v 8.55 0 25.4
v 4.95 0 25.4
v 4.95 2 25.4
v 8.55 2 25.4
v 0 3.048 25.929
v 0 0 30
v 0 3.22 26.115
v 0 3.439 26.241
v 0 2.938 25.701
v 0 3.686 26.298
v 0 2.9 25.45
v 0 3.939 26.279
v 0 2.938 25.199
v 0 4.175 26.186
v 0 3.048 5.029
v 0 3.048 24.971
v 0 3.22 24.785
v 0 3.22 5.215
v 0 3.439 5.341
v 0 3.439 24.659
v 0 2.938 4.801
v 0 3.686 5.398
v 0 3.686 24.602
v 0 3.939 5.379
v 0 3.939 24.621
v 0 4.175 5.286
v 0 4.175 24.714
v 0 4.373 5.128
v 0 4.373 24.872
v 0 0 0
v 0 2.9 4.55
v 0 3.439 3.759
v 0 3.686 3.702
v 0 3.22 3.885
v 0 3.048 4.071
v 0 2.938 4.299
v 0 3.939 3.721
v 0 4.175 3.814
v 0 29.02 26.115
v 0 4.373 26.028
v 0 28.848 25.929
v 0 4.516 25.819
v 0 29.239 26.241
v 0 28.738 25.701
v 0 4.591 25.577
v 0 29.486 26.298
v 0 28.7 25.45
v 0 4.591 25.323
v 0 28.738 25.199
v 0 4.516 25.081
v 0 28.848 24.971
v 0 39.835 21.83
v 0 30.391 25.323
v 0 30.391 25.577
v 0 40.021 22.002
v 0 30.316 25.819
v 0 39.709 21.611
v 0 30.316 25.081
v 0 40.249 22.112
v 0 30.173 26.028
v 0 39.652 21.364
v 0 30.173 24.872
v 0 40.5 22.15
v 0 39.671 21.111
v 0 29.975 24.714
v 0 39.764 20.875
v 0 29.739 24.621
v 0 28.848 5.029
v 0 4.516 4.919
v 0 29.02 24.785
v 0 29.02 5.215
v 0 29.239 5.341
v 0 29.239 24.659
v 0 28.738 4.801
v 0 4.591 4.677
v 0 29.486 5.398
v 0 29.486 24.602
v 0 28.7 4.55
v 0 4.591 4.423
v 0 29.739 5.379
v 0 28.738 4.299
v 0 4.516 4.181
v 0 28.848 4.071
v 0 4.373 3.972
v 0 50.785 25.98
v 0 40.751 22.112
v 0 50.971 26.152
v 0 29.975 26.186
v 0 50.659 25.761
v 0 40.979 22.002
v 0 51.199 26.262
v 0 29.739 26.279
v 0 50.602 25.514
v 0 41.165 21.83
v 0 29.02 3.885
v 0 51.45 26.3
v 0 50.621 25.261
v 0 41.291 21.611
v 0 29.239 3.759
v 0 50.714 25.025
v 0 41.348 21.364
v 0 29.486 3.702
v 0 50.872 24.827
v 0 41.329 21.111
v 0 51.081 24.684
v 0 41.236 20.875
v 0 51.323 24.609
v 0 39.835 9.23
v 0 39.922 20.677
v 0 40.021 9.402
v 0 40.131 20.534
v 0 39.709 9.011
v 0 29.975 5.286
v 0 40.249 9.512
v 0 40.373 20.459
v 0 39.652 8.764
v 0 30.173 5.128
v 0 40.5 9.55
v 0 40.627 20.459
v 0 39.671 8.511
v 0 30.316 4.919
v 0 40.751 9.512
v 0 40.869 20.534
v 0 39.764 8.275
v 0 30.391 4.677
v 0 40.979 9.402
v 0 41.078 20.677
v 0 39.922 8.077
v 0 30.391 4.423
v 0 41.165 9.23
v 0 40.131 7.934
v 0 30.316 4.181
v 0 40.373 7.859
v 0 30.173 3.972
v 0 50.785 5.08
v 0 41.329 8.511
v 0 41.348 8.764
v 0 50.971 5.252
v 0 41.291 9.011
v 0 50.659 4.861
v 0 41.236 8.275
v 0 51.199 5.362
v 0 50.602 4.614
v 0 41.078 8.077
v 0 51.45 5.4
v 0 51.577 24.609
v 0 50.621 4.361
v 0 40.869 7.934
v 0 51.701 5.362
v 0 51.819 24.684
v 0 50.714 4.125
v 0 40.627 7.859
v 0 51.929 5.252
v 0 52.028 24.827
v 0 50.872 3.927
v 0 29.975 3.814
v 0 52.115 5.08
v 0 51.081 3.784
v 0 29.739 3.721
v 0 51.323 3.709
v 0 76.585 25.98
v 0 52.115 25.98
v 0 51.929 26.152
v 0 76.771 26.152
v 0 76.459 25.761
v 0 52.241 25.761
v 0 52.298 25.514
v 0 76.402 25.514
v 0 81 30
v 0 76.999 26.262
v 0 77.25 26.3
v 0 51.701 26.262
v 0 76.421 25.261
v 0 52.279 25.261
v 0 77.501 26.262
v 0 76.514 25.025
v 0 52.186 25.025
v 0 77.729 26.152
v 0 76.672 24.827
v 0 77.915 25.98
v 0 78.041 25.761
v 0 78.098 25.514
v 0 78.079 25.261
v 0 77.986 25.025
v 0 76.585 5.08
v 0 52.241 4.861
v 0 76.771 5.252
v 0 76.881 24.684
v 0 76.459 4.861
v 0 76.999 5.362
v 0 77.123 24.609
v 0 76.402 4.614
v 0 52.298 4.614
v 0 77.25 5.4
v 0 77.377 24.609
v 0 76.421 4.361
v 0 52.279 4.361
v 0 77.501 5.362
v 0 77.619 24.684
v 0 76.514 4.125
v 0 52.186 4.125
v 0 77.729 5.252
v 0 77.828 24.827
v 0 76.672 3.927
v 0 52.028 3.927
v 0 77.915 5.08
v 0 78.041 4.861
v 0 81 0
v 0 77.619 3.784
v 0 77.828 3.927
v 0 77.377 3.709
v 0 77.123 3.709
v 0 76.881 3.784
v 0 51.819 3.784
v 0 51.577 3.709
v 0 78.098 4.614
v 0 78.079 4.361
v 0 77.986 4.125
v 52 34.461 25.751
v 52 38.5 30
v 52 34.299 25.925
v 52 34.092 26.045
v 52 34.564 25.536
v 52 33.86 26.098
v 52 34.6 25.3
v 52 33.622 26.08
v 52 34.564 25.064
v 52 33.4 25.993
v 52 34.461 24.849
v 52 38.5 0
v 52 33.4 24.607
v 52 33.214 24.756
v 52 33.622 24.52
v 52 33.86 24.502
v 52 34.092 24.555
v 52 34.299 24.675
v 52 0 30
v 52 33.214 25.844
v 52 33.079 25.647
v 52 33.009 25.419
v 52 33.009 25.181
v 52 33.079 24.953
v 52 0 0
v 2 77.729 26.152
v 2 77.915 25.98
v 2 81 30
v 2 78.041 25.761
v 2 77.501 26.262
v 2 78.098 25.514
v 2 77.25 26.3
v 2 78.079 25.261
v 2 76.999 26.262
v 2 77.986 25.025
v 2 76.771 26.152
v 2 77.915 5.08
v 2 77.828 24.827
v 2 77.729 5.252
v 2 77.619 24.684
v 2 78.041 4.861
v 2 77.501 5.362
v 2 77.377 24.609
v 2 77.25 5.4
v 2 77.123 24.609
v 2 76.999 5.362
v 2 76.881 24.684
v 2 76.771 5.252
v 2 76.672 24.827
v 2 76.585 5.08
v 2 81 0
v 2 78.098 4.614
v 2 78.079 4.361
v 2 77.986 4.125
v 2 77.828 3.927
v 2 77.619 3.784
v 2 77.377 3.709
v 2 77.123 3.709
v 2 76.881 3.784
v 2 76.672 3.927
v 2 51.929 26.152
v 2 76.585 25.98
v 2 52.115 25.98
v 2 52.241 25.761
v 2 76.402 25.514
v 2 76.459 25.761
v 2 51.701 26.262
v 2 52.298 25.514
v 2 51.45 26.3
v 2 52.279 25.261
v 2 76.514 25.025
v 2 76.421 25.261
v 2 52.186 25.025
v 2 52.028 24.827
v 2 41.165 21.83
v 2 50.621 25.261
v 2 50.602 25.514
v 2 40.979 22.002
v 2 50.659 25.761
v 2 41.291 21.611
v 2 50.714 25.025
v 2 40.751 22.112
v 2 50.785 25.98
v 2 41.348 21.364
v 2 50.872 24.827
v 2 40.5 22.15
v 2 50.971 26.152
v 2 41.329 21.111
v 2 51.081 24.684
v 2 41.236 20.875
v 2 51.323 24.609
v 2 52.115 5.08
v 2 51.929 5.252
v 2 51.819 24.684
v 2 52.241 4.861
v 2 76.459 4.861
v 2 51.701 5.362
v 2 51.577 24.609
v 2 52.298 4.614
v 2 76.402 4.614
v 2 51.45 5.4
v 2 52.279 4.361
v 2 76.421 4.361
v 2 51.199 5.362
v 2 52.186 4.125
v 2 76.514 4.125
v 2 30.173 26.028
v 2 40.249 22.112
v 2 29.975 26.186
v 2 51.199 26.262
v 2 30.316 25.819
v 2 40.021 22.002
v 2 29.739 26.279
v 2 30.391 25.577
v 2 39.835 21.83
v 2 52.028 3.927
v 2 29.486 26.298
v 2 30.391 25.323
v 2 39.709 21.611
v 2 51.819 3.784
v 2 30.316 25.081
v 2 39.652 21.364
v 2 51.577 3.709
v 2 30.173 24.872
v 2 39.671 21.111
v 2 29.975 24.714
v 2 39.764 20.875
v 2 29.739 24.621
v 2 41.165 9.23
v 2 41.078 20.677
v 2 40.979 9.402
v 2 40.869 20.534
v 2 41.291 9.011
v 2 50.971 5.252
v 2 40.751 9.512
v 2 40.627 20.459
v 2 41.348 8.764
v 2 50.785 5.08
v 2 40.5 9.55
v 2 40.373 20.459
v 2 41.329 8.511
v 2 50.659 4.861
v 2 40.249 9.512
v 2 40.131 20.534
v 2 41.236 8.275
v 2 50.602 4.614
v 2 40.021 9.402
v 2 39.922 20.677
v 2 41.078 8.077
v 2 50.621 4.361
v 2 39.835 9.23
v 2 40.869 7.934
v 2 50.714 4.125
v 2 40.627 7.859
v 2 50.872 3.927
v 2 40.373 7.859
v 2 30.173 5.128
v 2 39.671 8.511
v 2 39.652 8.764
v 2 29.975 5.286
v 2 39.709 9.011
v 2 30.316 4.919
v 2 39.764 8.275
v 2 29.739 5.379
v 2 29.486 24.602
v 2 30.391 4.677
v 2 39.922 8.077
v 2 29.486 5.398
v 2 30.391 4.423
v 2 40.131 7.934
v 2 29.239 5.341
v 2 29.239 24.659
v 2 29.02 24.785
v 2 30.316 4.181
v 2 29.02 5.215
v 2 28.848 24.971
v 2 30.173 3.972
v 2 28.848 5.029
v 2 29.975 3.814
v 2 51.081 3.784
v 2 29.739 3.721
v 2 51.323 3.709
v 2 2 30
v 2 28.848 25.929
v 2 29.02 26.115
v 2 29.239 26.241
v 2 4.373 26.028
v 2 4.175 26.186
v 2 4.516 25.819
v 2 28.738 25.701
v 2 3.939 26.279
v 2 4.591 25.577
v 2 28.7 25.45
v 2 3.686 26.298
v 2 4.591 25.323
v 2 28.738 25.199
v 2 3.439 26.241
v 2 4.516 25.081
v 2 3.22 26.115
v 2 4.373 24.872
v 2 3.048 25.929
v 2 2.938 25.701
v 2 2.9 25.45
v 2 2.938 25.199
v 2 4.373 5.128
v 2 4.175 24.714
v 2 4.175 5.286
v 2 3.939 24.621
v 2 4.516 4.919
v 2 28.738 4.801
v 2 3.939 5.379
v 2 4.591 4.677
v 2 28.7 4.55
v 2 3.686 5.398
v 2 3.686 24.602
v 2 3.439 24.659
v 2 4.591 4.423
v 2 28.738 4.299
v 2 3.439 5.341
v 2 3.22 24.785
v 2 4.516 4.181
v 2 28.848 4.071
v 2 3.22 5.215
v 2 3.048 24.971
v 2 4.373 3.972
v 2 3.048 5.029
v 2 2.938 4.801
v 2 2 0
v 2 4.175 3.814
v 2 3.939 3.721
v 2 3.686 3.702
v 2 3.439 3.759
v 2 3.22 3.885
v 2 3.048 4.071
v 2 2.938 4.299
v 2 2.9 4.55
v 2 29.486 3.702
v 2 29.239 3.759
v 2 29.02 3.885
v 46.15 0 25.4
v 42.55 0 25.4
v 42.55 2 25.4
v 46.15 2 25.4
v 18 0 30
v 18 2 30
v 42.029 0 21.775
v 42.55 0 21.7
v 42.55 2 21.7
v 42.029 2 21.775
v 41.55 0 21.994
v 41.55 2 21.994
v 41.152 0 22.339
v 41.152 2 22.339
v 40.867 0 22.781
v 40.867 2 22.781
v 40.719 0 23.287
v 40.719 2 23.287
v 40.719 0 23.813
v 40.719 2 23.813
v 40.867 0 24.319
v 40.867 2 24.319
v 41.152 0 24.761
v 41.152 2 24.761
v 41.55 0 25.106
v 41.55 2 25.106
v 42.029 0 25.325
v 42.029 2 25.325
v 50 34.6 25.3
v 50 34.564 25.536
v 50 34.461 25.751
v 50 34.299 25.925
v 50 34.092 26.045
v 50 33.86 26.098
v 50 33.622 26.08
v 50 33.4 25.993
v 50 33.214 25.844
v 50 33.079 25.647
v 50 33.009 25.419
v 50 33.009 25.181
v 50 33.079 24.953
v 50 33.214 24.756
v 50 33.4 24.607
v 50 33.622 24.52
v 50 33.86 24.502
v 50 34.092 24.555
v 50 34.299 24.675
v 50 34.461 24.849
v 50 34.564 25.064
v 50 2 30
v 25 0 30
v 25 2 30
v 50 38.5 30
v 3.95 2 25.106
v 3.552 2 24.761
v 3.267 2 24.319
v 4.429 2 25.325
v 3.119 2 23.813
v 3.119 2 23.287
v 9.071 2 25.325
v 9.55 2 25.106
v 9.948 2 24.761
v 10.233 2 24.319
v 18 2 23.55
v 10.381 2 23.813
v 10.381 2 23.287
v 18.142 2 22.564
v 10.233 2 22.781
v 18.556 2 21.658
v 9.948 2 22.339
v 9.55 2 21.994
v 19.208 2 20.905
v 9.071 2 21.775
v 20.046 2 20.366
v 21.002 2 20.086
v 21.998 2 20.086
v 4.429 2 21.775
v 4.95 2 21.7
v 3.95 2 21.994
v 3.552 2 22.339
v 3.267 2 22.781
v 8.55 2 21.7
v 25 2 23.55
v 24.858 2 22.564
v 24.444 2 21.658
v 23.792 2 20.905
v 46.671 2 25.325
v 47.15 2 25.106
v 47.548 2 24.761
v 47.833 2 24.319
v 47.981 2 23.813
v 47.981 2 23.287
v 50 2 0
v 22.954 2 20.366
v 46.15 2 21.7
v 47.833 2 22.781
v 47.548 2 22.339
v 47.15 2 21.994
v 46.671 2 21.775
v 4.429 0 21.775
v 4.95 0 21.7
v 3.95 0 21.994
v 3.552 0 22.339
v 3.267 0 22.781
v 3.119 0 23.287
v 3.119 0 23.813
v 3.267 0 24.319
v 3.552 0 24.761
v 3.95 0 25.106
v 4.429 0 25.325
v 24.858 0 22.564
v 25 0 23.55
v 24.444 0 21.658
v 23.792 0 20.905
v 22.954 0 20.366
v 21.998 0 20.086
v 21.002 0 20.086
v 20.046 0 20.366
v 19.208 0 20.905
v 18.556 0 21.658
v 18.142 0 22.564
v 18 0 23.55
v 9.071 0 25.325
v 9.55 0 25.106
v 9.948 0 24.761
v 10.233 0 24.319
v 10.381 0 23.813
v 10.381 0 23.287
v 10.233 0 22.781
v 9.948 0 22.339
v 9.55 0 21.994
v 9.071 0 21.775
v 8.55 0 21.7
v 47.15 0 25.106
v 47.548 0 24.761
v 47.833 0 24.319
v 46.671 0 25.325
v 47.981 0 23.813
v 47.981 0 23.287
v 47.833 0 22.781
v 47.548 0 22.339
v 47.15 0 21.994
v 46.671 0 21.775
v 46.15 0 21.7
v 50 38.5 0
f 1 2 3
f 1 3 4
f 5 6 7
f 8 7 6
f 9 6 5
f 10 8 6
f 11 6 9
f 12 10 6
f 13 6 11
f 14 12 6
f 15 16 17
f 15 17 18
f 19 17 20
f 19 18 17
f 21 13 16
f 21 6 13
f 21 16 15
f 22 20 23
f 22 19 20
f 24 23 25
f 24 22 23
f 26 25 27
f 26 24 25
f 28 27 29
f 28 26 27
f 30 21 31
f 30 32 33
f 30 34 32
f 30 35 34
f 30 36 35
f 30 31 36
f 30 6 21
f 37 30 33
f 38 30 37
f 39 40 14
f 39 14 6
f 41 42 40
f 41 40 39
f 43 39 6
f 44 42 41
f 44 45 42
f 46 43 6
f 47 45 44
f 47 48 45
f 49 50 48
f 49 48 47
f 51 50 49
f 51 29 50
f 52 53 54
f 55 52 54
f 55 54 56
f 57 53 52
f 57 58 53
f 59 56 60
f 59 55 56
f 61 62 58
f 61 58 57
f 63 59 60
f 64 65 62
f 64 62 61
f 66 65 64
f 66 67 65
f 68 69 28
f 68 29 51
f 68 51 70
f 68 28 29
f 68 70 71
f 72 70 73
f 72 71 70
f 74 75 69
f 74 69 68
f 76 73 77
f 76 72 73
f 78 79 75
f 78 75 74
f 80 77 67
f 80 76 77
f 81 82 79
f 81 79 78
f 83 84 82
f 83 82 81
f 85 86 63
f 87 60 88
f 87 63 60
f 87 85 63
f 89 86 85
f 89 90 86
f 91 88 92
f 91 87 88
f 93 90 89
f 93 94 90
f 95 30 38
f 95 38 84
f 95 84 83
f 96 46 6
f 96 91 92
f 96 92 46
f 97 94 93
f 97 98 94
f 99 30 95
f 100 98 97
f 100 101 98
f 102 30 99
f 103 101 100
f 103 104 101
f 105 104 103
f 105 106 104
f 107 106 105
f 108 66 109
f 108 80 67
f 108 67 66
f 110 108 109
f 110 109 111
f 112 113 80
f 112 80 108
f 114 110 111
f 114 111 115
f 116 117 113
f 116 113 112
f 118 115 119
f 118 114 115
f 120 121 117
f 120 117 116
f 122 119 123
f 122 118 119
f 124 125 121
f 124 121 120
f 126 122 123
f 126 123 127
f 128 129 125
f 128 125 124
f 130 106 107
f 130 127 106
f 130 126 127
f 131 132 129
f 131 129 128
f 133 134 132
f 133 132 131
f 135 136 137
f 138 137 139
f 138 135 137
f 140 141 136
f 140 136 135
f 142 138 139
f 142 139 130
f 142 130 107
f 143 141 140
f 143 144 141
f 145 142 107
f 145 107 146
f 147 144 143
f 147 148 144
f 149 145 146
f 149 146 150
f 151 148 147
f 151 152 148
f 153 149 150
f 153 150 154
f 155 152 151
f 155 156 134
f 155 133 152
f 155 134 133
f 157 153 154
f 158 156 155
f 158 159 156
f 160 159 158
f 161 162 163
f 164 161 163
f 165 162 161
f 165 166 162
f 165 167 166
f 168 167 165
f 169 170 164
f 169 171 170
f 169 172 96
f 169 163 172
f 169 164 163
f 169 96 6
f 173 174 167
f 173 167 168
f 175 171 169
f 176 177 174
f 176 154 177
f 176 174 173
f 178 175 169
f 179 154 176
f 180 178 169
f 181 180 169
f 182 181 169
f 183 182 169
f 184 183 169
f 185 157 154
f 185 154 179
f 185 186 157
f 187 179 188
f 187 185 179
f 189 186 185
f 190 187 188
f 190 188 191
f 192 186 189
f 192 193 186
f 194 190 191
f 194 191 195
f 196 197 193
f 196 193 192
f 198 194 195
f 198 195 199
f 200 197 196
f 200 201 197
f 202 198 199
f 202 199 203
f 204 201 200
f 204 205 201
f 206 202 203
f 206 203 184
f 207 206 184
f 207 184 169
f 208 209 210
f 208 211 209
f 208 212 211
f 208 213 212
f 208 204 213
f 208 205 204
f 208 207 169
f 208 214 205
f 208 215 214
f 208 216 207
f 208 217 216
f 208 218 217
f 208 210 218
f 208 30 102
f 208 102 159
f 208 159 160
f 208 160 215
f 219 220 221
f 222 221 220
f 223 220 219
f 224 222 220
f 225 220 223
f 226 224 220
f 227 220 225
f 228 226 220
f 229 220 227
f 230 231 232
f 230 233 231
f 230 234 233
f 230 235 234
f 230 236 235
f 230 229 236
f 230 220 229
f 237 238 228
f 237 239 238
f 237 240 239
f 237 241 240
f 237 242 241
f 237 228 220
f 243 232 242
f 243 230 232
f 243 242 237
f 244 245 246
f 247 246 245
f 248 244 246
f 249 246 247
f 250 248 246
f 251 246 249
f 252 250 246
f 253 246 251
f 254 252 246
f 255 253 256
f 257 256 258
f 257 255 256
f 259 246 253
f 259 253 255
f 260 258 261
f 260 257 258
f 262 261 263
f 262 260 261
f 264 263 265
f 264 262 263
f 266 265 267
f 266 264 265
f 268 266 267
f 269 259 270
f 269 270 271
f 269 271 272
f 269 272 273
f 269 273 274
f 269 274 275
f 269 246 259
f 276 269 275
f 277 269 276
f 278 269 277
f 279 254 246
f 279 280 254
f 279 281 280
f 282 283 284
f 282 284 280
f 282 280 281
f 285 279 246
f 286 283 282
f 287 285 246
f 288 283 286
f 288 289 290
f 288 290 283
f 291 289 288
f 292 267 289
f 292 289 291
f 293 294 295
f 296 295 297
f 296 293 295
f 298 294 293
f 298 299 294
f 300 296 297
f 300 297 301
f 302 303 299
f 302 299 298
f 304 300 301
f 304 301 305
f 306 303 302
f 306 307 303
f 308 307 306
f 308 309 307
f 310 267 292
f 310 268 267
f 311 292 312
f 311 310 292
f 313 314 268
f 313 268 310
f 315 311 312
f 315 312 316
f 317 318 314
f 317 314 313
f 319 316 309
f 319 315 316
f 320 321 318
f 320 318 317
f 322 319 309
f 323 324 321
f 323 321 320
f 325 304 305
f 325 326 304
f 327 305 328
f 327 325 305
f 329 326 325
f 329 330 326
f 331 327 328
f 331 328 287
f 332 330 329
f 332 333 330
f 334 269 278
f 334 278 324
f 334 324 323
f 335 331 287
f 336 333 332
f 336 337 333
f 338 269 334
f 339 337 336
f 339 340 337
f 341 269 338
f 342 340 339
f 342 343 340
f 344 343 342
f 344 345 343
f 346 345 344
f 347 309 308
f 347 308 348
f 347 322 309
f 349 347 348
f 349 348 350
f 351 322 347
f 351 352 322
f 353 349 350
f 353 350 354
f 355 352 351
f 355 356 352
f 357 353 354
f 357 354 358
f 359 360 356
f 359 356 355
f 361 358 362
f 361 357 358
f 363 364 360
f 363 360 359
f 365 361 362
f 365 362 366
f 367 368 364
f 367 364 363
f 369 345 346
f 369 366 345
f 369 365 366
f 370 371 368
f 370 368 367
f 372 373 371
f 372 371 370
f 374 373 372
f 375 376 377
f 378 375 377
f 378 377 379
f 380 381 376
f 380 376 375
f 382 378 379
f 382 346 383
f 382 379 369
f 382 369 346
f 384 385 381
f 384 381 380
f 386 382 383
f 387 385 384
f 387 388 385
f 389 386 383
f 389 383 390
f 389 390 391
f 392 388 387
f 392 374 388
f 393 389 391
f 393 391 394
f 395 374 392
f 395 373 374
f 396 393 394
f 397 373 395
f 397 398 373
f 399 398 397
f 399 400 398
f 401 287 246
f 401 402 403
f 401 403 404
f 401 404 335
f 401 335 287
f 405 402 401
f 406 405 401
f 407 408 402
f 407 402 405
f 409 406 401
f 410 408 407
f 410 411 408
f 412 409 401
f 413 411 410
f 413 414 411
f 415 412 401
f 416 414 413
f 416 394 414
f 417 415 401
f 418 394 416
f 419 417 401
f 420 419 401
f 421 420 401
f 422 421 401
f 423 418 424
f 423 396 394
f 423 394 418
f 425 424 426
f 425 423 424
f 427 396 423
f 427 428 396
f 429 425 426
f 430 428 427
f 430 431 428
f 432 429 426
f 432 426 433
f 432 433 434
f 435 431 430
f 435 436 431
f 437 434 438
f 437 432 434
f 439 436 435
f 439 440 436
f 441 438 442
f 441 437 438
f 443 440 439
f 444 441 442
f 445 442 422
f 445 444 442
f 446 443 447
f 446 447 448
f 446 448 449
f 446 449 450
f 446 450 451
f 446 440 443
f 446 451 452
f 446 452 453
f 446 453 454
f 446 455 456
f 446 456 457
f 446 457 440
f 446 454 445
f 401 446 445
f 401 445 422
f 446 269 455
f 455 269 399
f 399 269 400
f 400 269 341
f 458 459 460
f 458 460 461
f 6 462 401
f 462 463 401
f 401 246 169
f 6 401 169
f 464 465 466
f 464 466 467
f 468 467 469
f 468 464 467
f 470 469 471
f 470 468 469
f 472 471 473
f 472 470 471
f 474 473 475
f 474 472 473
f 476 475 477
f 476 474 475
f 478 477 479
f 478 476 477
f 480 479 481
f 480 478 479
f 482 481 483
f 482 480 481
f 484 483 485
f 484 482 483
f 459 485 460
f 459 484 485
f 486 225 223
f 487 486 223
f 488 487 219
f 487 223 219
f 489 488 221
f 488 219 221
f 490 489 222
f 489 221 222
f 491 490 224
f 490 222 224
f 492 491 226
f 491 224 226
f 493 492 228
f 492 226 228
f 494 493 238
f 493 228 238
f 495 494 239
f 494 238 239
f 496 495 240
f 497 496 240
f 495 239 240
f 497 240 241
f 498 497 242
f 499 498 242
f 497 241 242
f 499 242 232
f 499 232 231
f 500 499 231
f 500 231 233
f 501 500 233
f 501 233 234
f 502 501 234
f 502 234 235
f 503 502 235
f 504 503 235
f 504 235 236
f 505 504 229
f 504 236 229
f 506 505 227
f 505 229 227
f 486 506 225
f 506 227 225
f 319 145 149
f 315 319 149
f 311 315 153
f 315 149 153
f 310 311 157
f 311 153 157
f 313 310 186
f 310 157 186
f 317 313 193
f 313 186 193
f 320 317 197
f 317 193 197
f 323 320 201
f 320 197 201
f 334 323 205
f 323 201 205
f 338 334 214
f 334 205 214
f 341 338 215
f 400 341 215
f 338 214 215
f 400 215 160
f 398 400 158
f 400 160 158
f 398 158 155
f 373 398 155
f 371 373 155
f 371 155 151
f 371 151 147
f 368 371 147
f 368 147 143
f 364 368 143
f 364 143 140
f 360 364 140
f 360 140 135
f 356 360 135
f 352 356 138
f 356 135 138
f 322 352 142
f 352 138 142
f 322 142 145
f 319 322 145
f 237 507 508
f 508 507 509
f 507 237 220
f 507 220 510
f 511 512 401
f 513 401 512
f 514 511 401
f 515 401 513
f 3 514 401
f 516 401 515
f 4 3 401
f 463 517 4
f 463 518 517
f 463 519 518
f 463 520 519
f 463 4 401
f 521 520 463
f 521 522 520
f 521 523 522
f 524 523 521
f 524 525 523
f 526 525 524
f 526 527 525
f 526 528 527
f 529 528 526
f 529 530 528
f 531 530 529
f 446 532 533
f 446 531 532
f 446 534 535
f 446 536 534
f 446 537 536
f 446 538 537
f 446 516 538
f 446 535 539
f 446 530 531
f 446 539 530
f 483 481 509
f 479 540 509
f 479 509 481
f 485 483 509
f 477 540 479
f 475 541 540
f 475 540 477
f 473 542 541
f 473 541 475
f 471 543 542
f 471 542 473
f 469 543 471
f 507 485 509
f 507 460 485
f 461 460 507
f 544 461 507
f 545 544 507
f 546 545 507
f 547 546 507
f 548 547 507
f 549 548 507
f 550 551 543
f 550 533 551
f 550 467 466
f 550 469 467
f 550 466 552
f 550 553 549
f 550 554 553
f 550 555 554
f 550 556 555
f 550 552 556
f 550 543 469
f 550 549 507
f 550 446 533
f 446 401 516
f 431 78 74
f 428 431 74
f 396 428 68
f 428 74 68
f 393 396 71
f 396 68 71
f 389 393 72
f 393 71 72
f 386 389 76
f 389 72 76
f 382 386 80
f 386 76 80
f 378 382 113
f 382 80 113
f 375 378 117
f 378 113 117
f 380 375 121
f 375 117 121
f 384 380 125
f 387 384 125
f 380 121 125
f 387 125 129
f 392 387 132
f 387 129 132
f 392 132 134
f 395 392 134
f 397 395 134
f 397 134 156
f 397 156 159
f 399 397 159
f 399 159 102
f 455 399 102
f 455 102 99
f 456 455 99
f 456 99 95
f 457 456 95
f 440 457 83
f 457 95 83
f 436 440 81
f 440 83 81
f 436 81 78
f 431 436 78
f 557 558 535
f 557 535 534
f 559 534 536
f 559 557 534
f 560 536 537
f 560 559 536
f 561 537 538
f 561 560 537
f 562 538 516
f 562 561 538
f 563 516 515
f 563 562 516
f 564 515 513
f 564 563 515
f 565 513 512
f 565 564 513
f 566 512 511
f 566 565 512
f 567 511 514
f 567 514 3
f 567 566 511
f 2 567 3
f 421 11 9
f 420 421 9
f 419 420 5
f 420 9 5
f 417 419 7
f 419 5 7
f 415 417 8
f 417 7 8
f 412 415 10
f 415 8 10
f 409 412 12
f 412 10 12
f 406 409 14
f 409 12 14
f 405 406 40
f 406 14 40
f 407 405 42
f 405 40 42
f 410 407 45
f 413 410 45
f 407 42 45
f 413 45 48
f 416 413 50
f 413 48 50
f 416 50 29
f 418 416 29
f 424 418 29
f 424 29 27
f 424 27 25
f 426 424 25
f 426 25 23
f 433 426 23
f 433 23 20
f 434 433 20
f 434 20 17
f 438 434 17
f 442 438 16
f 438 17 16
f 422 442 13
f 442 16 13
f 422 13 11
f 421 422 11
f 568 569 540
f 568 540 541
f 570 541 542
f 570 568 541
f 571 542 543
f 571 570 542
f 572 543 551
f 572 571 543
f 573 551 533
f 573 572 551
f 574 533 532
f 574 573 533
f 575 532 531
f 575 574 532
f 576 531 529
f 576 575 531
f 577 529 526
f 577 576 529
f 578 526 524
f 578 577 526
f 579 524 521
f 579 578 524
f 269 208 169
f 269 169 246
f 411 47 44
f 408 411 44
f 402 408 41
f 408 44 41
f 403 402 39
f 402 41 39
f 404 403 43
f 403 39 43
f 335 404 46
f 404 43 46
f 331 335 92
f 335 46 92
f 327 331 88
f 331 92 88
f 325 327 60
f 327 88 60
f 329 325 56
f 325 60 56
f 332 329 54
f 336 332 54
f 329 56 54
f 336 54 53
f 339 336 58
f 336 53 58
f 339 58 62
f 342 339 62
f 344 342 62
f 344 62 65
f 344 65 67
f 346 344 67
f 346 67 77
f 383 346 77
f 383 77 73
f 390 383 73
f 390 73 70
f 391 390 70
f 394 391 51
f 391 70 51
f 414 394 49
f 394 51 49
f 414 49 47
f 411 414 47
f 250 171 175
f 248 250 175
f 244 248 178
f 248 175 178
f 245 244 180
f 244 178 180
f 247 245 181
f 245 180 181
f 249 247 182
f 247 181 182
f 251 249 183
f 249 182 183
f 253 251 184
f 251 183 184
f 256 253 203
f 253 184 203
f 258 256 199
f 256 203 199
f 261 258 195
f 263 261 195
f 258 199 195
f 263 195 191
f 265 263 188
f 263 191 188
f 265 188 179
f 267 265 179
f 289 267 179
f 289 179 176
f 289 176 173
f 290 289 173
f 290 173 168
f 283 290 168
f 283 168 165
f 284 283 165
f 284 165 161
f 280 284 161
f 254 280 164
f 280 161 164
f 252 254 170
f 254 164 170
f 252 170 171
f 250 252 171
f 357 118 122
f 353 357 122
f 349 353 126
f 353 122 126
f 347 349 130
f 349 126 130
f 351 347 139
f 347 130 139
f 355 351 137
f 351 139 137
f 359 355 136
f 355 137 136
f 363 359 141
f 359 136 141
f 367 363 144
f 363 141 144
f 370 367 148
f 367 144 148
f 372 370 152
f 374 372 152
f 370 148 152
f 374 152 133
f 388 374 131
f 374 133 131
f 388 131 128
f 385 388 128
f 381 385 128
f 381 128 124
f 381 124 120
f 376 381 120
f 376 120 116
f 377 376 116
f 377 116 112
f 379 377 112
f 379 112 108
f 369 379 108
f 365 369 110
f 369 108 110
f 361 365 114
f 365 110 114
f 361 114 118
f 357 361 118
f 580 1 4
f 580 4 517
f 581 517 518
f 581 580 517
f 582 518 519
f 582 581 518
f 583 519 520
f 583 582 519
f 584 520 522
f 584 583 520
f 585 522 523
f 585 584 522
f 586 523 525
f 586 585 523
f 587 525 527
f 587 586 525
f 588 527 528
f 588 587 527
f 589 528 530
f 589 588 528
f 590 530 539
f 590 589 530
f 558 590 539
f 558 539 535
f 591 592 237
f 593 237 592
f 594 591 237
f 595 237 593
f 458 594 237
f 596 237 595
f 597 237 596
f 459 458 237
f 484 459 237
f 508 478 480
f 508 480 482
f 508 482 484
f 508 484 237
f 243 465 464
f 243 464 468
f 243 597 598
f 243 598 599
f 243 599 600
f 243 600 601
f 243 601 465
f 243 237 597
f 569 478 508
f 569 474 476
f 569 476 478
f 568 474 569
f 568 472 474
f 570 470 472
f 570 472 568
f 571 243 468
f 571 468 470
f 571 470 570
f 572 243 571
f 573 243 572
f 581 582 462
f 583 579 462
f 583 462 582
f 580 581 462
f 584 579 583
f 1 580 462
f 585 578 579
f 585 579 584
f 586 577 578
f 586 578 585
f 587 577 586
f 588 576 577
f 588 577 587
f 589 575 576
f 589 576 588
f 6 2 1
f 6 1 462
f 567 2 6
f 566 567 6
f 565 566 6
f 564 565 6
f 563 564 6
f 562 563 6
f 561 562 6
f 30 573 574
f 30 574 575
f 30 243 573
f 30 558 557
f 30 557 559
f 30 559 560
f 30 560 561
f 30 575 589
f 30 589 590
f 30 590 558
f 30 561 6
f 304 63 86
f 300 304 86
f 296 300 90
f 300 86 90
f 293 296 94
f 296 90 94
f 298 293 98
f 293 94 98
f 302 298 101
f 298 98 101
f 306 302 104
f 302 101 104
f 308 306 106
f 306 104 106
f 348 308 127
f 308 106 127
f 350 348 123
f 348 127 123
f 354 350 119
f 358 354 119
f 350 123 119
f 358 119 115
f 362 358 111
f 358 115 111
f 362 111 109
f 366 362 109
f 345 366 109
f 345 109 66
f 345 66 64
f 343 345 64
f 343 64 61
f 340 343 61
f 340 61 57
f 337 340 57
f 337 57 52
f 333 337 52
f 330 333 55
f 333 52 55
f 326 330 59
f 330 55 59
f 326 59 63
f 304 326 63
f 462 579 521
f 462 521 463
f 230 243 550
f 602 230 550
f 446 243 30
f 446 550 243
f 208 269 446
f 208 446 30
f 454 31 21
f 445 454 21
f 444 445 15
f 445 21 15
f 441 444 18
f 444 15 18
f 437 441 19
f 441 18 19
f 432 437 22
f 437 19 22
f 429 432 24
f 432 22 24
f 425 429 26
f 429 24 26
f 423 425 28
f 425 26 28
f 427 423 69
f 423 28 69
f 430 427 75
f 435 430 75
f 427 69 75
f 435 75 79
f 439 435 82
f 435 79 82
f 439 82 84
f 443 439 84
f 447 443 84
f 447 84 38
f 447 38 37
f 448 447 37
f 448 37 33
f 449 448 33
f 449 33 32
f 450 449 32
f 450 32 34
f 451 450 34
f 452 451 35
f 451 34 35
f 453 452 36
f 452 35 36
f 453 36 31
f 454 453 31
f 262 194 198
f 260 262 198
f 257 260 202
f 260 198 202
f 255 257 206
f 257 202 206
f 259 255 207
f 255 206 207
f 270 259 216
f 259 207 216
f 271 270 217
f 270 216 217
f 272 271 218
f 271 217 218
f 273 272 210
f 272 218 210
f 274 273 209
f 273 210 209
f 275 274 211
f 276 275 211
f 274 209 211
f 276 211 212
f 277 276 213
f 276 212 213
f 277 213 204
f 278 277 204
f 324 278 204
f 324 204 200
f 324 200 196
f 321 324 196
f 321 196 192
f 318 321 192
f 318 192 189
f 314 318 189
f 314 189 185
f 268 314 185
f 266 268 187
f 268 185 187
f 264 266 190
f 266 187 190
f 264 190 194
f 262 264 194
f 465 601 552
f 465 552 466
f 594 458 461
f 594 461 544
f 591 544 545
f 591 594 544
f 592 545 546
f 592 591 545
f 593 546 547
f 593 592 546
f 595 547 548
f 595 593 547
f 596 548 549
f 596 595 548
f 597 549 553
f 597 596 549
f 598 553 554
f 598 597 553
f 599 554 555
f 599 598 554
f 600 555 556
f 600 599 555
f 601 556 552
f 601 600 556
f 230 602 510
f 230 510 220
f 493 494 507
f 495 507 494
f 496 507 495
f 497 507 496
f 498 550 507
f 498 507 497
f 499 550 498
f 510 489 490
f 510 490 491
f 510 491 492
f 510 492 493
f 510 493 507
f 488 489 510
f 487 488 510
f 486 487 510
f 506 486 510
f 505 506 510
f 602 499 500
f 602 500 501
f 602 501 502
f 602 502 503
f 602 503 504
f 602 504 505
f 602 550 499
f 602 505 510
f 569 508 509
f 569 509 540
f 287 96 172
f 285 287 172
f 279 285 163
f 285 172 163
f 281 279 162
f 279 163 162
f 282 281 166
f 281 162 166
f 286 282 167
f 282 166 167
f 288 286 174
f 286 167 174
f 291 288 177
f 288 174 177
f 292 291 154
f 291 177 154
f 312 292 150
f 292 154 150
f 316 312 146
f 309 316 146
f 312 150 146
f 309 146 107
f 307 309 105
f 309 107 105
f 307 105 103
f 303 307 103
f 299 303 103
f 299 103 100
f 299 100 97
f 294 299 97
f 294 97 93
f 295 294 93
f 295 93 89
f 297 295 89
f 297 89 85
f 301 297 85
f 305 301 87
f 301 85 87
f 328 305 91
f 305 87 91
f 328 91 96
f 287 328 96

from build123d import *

# Parameters (mm, degrees)
SALIENTE_EXTRUIR1_DEPTH = 30
CROQUIS2_R              = 0.8
CORTAR_EXTRUIR1_DEPTH   = 2
CROQUIS3_R              = 0.85
CORTAR_EXTRUIR2_DEPTH   = 2
CORTAR_EXTRUIR3_DEPTH   = 2


with BuildPart() as part:
    # Croquis1 → Saliente-Extruir1 (new body)
    with BuildSketch(Plane.XY):
        Polygon((0, 0), (0, 81), (2, 81), (2, 2), (50, 2), (50, 38.5), (52, 38.5), (52, 0), align=None)
    extrude(amount=SALIENTE_EXTRUIR1_DEPTH)

    # Croquis2 → Cortar-Extruir1 (cut)
    with BuildSketch(Plane(origin=(52, 0, 0), x_dir=(0, 0, -1), z_dir=(1, 0, 0))):
        with Locations(Location((-25.3, 33.8, 0), (0, 0, 90))):
            Circle(CROQUIS2_R)
    extrude(amount=-CORTAR_EXTRUIR1_DEPTH, mode=Mode.SUBTRACT)

    # Croquis3 → Cortar-Extruir2 (cut)
    with BuildSketch(Plane.ZY):
        with Locations((4.55, 77.25)):
            Circle(CROQUIS3_R)
        with Locations((25.45, 77.25)):
            Circle(CROQUIS3_R)
        with Locations((25.45, 51.45)):
            Circle(CROQUIS3_R)
        with Locations((4.55, 51.45)):
            Circle(CROQUIS3_R)
        with Locations(Location((25.45, 29.55, 0), (0, 0, 270))):
            Circle(CROQUIS3_R)
        with Locations(Location((4.55, 29.55, 0), (0, 0, 270))):
            Circle(CROQUIS3_R)
        with Locations(Location((25.45, 3.75, 0), (0, 0, 270))):
            Circle(CROQUIS3_R)
        with Locations(Location((4.55, 3.75, 0), (0, 0, 270))):
            Circle(CROQUIS3_R)
        with Locations((8.7, 40.5)):
            Circle(CROQUIS3_R)
        with Locations((21.3, 40.5)):
            Circle(CROQUIS3_R)
    extrude(amount=-CORTAR_EXTRUIR2_DEPTH, mode=Mode.SUBTRACT)

    # Croquis4 → Cortar-Extruir3 (cut)
    with BuildSketch(Plane.XZ):
        with BuildLine():
            Line((4.95, 25.4), (8.55, 25.4))
            ThreePointArc((8.55, 25.4), (10.4, 23.55), (8.55, 21.7))
            Line((8.55, 21.7), (4.95, 21.7))
            ThreePointArc((4.95, 21.7), (3.1, 23.55), (4.95, 25.4))
        make_face()
        with BuildLine():
            Line((42.55, 25.4), (46.15, 25.4))
            ThreePointArc((46.15, 25.4), (48, 23.55), (46.15, 21.7))
            Line((46.15, 21.7), (42.55, 21.7))
            ThreePointArc((42.55, 21.7), (40.7, 23.55), (42.55, 25.4))
        make_face()
        with BuildLine():
            Line((18, 23.55), (18, 30))
            ThreePointArc((18, 30), (21.5, 33.5), (25, 30))
            Line((25, 30), (25, 23.55))
            ThreePointArc((25, 23.55), (21.5, 20.05), (18, 23.55))
        make_face()
    extrude(amount=-CORTAR_EXTRUIR3_DEPTH, mode=Mode.SUBTRACT)


solid = part.part
